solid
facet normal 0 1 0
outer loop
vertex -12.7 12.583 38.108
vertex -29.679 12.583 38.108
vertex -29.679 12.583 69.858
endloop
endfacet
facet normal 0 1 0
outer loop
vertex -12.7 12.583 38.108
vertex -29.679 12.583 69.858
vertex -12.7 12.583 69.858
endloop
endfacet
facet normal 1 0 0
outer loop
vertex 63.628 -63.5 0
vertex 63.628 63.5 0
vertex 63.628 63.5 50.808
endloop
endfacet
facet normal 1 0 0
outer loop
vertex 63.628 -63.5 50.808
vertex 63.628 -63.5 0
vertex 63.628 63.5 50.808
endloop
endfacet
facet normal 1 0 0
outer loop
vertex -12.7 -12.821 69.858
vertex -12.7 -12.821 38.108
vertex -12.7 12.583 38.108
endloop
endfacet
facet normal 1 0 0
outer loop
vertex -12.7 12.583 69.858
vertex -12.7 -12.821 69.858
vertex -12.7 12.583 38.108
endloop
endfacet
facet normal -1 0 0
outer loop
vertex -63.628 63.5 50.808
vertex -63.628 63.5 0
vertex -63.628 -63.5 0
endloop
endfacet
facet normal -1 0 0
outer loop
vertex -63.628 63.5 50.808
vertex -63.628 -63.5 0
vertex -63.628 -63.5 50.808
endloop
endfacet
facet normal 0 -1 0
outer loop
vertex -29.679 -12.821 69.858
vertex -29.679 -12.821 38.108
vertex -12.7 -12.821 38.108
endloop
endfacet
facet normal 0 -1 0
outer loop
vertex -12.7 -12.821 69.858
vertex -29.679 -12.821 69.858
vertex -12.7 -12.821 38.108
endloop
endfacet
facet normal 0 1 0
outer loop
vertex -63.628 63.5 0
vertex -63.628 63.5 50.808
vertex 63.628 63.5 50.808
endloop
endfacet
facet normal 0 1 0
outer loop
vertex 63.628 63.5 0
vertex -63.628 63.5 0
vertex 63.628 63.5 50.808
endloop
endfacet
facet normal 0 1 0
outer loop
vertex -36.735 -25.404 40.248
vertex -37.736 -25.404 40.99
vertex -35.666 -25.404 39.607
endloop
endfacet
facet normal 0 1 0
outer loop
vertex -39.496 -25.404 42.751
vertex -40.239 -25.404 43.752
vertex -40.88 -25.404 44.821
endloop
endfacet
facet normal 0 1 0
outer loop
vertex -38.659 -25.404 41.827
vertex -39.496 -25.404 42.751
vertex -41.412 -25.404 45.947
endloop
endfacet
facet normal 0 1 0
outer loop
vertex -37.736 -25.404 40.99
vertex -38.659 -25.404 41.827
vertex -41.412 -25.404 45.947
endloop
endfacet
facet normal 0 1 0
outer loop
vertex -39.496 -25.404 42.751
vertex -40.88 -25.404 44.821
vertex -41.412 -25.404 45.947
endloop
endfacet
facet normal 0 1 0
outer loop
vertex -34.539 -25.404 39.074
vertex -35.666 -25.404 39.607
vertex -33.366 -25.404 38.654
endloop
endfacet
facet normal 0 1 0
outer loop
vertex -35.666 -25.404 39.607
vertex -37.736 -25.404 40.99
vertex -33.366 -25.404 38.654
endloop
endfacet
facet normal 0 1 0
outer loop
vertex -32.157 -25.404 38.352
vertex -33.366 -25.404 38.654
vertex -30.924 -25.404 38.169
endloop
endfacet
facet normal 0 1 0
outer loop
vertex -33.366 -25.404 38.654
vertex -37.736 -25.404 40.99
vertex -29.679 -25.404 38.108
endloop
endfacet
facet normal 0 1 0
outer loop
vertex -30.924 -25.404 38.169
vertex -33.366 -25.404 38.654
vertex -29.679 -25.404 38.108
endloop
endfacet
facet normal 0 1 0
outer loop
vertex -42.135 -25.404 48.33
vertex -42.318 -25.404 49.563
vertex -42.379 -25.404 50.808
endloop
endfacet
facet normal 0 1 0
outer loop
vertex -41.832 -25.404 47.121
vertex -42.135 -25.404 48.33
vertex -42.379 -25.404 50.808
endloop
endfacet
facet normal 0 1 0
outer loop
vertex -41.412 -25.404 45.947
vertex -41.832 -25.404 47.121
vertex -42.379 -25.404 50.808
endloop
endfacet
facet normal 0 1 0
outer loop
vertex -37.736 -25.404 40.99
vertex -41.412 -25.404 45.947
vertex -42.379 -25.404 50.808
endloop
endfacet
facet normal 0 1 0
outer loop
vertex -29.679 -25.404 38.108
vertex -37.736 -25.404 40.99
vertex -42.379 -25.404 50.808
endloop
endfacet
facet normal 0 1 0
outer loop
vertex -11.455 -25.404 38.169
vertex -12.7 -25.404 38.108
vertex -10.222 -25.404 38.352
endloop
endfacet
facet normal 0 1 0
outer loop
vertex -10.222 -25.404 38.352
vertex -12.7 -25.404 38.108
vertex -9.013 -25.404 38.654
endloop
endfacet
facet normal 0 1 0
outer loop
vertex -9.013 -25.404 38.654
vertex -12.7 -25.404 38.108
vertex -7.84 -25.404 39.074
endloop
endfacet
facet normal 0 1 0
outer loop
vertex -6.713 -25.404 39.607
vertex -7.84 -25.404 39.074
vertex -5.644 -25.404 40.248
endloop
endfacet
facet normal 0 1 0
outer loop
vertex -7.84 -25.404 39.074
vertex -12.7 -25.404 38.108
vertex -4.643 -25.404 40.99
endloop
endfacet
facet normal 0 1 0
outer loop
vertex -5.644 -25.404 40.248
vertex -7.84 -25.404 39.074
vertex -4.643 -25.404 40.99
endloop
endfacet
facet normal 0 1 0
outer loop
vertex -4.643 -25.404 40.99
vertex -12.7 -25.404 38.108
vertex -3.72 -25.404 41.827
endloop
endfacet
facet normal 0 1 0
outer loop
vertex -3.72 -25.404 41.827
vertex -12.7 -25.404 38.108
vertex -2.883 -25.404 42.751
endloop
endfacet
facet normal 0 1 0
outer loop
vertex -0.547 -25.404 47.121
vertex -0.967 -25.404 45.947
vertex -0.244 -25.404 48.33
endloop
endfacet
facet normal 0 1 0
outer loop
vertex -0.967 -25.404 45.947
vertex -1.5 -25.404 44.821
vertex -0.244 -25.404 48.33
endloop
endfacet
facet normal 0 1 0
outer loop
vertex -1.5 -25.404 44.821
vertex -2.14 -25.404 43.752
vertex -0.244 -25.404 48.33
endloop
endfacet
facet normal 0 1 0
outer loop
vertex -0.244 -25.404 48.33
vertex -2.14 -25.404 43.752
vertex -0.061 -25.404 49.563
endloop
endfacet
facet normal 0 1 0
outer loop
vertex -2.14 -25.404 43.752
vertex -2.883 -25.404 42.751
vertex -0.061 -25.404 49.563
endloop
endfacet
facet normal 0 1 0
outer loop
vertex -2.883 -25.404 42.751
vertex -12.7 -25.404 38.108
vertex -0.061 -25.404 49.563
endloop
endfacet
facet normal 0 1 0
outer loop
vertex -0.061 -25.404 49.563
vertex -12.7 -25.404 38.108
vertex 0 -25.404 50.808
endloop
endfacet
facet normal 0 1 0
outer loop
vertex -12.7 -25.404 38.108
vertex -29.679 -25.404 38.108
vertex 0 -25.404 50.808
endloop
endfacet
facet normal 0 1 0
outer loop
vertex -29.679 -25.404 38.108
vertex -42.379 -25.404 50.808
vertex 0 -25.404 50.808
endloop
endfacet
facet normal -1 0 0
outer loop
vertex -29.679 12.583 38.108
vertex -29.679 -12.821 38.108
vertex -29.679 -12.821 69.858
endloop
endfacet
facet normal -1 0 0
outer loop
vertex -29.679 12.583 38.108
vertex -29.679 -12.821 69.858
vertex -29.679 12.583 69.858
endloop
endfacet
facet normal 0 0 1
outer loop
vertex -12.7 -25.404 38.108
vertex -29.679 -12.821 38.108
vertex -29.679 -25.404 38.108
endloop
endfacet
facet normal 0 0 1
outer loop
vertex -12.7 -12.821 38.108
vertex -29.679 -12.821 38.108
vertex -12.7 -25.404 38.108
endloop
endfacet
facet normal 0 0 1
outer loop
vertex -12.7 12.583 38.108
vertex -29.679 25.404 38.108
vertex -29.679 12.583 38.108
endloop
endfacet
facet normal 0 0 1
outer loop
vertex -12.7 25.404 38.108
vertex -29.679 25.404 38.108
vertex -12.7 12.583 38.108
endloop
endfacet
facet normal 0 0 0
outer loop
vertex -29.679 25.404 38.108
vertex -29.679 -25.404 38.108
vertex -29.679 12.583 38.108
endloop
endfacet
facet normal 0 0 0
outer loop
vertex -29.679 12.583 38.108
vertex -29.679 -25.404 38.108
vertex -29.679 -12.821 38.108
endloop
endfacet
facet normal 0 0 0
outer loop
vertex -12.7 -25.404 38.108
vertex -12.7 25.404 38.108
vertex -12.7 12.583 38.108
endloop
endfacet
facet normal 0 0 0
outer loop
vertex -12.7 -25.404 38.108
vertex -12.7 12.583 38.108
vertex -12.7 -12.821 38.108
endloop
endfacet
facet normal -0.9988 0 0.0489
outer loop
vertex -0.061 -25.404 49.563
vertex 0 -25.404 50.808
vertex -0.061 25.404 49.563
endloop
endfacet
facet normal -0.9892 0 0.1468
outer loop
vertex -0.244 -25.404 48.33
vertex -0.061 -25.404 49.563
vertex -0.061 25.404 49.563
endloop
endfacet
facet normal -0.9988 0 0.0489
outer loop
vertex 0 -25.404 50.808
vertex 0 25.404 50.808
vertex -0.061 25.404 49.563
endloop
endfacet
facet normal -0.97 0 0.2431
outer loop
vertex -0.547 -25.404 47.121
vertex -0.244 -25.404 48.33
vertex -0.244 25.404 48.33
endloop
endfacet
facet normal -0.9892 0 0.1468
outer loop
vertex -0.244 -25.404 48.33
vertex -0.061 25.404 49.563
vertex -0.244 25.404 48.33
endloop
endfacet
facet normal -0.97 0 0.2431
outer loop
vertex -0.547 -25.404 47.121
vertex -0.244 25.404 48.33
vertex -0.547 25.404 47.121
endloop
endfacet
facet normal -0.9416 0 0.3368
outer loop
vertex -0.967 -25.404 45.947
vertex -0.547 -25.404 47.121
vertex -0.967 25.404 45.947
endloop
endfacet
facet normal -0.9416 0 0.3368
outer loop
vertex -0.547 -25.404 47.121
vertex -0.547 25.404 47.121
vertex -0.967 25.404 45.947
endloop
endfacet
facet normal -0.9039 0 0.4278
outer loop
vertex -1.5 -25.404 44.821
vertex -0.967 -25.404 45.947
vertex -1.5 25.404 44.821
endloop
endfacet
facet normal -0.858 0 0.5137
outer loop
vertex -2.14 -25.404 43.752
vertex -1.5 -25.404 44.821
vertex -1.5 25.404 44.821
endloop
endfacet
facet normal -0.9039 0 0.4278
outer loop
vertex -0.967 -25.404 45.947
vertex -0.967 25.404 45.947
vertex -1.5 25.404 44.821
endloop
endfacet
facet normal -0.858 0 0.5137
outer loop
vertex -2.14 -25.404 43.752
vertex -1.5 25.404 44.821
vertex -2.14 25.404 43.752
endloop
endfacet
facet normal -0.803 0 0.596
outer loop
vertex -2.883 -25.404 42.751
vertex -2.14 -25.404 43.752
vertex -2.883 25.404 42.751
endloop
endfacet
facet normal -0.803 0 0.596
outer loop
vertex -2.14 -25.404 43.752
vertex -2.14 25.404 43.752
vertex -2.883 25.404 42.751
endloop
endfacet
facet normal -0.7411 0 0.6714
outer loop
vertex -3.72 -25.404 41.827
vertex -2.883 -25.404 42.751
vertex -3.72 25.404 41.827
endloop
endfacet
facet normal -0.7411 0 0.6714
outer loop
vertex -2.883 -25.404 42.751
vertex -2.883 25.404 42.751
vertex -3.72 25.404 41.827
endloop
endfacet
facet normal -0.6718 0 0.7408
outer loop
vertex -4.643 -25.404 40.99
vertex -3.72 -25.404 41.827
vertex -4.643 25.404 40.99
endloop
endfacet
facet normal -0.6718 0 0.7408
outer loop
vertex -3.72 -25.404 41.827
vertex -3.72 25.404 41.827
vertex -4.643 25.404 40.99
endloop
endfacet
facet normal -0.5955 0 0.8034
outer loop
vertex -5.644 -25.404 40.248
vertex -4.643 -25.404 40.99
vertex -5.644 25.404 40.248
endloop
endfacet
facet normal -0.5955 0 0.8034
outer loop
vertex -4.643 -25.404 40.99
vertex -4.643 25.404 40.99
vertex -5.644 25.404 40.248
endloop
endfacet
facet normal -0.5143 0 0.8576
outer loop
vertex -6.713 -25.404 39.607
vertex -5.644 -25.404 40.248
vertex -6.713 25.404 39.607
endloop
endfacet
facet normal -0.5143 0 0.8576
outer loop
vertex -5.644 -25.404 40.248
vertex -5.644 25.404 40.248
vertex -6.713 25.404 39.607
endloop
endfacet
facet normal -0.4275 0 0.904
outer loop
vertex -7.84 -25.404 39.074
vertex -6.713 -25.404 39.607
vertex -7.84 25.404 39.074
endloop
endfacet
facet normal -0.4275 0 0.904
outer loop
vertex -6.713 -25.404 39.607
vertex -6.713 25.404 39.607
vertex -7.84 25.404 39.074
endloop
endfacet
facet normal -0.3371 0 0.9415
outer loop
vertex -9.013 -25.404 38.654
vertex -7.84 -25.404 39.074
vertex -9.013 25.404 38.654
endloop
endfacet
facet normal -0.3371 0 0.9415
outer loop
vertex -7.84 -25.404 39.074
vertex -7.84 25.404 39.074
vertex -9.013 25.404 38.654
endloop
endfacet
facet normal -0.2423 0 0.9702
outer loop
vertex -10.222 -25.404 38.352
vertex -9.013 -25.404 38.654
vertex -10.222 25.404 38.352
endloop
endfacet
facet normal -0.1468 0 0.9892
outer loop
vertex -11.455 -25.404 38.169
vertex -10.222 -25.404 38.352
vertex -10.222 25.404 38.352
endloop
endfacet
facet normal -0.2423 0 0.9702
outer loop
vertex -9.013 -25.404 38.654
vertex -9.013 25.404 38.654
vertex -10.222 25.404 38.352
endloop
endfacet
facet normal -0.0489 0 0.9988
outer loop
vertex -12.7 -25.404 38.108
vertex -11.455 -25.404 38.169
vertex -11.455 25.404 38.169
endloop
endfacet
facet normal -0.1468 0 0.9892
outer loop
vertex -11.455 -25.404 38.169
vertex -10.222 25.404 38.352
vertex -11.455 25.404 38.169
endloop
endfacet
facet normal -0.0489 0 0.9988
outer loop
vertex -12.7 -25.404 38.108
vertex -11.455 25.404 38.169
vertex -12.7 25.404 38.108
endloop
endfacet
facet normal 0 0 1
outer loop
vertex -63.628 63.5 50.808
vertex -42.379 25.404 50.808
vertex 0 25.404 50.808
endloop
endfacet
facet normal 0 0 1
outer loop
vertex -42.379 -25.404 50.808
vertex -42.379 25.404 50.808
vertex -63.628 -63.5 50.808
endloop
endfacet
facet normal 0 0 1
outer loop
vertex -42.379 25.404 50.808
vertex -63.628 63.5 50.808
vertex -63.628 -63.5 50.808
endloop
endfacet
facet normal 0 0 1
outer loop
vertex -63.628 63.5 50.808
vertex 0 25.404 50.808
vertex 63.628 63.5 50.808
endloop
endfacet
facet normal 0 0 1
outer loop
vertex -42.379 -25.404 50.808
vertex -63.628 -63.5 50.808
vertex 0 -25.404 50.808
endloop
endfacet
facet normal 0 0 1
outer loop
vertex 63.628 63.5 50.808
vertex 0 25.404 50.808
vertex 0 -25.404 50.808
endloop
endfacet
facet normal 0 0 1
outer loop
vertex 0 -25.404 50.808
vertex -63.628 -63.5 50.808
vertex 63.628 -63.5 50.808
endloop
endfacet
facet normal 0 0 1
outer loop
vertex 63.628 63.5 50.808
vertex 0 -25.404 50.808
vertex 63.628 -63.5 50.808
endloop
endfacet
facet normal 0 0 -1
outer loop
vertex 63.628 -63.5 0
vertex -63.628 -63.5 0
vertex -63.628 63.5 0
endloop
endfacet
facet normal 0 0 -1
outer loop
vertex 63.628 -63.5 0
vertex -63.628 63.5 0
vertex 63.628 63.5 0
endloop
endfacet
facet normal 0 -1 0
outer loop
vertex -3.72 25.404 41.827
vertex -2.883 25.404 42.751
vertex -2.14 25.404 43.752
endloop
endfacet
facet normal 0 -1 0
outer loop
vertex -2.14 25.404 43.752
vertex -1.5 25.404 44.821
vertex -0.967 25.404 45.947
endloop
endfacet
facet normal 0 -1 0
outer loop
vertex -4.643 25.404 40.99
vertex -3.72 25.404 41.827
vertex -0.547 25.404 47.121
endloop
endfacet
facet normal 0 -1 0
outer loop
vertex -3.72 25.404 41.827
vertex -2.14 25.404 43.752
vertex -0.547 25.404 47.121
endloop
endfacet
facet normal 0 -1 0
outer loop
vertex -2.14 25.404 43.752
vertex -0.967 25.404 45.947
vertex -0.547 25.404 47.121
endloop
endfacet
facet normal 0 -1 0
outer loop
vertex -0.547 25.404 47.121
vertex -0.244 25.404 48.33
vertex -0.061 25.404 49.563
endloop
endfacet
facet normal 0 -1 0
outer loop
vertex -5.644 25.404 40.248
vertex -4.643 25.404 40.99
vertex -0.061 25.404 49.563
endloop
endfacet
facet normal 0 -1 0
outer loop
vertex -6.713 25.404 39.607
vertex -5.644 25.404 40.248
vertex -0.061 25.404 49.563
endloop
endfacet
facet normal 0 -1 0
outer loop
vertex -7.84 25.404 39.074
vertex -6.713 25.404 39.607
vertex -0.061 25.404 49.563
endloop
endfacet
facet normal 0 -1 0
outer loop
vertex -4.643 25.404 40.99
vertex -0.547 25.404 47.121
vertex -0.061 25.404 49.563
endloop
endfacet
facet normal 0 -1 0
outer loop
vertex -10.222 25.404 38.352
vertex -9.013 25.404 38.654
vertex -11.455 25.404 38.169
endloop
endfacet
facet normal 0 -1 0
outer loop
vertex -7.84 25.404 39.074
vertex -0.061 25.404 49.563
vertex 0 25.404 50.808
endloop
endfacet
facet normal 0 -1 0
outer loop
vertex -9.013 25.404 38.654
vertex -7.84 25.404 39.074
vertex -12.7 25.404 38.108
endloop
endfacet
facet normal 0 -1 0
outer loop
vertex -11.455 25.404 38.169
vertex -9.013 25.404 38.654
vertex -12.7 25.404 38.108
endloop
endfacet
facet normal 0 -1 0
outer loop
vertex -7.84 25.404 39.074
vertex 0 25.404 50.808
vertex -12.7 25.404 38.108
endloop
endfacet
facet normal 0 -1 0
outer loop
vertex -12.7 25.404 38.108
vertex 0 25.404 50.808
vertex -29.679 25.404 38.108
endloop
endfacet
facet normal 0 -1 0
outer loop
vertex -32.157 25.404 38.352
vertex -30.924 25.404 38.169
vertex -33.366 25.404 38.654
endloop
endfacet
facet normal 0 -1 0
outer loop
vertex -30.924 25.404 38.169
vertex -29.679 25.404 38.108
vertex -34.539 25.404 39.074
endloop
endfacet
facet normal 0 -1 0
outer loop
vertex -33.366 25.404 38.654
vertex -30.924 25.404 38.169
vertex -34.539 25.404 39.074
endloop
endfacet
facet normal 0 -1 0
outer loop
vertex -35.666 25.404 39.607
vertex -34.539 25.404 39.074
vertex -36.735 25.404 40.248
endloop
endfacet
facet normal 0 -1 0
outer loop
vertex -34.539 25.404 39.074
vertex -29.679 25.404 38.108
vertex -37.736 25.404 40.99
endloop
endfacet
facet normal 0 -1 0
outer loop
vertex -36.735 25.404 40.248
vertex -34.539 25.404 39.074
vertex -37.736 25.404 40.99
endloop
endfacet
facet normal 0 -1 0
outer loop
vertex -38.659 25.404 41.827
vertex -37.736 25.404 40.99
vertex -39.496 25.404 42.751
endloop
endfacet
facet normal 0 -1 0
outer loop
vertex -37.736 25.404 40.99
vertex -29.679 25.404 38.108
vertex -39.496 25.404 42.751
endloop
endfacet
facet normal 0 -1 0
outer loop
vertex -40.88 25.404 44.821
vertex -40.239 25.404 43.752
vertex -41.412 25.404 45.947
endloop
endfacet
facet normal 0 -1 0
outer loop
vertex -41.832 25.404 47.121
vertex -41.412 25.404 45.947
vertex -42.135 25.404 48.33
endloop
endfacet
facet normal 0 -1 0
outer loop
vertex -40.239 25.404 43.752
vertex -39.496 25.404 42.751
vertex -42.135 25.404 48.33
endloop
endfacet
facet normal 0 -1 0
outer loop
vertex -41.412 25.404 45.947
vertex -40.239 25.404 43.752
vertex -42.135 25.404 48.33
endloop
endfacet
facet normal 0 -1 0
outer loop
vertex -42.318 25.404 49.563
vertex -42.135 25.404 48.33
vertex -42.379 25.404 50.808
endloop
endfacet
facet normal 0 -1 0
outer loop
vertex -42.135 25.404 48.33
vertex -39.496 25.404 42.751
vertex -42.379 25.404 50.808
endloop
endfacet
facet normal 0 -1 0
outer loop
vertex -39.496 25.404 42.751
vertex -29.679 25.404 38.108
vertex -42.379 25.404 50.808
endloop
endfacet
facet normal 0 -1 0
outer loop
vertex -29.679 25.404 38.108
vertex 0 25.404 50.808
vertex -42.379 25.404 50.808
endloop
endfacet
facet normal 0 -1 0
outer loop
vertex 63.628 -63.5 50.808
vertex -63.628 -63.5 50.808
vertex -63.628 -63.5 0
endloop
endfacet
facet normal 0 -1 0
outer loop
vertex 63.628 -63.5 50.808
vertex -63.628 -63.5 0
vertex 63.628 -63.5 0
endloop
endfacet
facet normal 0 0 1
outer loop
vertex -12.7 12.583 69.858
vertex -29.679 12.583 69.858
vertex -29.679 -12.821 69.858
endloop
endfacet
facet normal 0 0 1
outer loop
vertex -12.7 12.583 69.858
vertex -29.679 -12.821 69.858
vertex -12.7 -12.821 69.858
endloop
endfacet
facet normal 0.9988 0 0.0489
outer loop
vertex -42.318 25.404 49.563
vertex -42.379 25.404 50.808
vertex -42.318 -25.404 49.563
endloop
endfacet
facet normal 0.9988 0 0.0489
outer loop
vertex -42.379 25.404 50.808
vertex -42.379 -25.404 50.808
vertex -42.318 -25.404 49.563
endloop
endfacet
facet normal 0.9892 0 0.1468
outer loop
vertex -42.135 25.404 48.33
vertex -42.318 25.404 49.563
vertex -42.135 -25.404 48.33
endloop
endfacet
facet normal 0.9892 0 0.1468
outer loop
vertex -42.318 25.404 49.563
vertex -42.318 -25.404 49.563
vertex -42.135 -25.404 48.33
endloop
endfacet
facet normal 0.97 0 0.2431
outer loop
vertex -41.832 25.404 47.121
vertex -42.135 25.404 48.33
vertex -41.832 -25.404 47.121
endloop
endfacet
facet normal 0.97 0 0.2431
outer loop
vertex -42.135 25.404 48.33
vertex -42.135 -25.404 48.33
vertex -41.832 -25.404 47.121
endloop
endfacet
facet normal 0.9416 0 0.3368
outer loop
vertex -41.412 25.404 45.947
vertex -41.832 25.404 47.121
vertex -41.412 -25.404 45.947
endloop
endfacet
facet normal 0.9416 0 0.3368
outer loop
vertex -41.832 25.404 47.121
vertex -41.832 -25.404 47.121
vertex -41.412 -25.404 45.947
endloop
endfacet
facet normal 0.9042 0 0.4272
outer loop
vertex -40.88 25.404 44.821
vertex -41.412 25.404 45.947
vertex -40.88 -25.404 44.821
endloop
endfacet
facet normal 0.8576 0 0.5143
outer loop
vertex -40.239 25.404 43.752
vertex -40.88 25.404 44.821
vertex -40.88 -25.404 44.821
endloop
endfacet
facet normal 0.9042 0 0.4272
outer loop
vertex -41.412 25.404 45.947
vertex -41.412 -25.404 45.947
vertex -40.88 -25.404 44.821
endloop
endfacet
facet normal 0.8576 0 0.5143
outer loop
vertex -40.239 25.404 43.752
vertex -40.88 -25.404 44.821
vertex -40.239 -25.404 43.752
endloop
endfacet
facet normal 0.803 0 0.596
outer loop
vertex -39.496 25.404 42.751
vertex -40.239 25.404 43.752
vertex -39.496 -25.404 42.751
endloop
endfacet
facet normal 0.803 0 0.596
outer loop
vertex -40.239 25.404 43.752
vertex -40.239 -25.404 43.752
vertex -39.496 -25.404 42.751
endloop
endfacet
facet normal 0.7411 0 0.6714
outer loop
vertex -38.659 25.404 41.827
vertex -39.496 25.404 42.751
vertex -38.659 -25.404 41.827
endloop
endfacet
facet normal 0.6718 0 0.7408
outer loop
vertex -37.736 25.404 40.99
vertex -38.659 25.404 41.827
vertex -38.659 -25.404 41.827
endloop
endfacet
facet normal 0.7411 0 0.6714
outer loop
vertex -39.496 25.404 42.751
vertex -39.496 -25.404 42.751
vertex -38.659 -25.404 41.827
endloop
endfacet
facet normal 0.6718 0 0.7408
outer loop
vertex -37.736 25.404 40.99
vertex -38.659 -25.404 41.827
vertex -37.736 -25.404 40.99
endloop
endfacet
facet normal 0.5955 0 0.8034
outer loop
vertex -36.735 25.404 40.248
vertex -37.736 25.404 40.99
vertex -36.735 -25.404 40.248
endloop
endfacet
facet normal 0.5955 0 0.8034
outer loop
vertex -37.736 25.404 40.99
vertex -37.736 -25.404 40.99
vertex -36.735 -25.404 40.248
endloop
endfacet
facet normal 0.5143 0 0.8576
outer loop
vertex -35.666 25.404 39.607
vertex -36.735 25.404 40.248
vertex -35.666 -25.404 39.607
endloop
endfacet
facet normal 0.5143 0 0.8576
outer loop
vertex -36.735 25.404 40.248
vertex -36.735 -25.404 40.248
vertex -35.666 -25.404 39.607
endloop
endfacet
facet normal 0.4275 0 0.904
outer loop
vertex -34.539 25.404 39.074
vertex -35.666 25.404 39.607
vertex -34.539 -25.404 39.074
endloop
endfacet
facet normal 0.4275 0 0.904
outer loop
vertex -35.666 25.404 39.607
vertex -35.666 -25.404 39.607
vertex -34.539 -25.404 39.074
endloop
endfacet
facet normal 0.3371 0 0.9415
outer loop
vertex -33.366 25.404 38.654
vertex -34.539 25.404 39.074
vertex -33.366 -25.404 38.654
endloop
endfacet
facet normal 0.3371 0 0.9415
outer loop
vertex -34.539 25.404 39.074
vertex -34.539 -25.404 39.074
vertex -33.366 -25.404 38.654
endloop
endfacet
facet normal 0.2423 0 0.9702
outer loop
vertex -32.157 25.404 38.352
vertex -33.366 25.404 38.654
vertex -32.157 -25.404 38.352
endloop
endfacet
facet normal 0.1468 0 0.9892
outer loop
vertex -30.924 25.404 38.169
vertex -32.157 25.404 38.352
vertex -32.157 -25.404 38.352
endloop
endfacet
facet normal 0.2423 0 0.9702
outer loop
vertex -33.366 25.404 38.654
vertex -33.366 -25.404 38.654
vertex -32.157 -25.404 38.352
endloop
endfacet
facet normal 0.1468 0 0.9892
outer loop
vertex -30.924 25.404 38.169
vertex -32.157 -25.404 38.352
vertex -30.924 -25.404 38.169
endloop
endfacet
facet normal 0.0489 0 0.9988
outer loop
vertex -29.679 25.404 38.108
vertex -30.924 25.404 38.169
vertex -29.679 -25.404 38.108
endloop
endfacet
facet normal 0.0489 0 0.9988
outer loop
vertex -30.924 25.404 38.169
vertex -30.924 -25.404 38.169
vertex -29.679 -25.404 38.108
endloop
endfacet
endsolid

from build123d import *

# Parameters (mm, degrees)
F0_W          = 127.2562742233
F0_H          = 50.8075356483
F1_DEPTH      = 63.5
F1_DEPTH_BACK = 63.5
F3_DEPTH      = 12.7
F4_R          = 12.69999
F5_W          = 16.97918742
F5_H          = 25.4037678242
F6_DEPTH      = 31.75


# Not quite as in the source:
# - a fillet or chamfer is up to 0.001 mm smaller than in the source, because OpenCascade refuses the exact size


with BuildPart() as f1:
    # F0 (on Front) → F1 (new body, two sides)
    with BuildSketch(Plane.XZ) as f1_sk:
        with Locations((0, 25.4037678242)):
            Rectangle(F0_W, F0_H)
    extrude(amount=F1_DEPTH)
    extrude(f1_sk.sketch, amount=-F1_DEPTH_BACK)

    # F2 (on face) → F3 (cut)
    with BuildSketch(Plane.XY.offset(50.8075356483)):
        Polygon((0, -25.4037678242), (0, 0), (0, 25.4037678242), (-42.37918742, 25.4037678242), (-42.37918742, 0), (-42.37918742, -25.4037678242), align=None)
    extrude(amount=-F3_DEPTH, mode=Mode.SUBTRACT)

    # F4 (radius 12.7 in the source; OpenCascade refuses exactly that, so slightly less here)
    f4_edges = [f1.edges().sort_by_distance(p)[0] for p in [
        (-42.379187, 0, 38.107536),
        (0, 0, 38.107536),
    ]]
    fillet(f4_edges, radius=F4_R)

    # F5 (on face) → F6 (join)
    with BuildSketch(Plane.XY.offset(38.1075356483)):
        with Locations((-21.18959371, -0.1187091693)):
            Rectangle(F5_W, F5_H)
    extrude(amount=F6_DEPTH)


solid = f1.part
